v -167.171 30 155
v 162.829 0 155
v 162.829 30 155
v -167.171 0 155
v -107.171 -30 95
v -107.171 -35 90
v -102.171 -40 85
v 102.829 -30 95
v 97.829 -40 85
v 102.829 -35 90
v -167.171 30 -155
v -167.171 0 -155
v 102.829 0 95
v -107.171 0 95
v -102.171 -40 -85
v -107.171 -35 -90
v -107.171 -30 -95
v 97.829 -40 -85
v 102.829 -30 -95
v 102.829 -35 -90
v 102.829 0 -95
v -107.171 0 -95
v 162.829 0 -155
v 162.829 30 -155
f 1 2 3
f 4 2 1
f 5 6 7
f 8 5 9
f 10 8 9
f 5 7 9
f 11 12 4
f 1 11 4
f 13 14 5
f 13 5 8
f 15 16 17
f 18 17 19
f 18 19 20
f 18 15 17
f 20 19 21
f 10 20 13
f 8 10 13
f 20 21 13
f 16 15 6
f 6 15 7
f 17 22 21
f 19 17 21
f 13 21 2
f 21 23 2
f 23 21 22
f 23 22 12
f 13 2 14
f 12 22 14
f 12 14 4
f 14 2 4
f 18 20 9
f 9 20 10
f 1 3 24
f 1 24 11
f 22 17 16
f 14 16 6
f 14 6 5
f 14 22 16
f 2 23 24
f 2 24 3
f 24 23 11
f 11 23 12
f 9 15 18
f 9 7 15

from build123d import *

# Parameters (mm, degrees)
F0_W     = 210
F0_H     = 190
F1_DEPTH = 40
F2_W     = 330
F2_H     = 310
F3_DEPTH = 30
F4_SIZE  = 10
F5_SIZE  = 5


with BuildPart() as f1:
    # F0 (on Front) → F1 (new body)
    with BuildSketch(Plane.XZ):
        with Locations((-2.170864, 0)):
            Rectangle(F0_W, F0_H)
    extrude(amount=F1_DEPTH)

    # F2 (on face) → F3 (join)
    with BuildSketch(Plane(origin=(0, 0, 0), x_dir=(-1, 0, 0), z_dir=(0, 1, 0))):
        with Locations((2.170864, 0)):
            Rectangle(F2_W, F2_H)
    extrude(amount=F3_DEPTH)

    # F4
    f4_edges = [f1.edges().sort_by_distance(p)[0] for p in [
        (-2.170864, -40, 95),
        (-2.170864, -40, -95),
    ]]
    chamfer(f4_edges, length=F4_SIZE)

    # F5
    f5_edges = [f1.edges().sort_by_distance(p)[0] for p in [
        (-107.170864, -40, 0),
        (102.829136, -40, 0),
    ]]
    chamfer(f5_edges, length=F5_SIZE)


solid = f1.part
